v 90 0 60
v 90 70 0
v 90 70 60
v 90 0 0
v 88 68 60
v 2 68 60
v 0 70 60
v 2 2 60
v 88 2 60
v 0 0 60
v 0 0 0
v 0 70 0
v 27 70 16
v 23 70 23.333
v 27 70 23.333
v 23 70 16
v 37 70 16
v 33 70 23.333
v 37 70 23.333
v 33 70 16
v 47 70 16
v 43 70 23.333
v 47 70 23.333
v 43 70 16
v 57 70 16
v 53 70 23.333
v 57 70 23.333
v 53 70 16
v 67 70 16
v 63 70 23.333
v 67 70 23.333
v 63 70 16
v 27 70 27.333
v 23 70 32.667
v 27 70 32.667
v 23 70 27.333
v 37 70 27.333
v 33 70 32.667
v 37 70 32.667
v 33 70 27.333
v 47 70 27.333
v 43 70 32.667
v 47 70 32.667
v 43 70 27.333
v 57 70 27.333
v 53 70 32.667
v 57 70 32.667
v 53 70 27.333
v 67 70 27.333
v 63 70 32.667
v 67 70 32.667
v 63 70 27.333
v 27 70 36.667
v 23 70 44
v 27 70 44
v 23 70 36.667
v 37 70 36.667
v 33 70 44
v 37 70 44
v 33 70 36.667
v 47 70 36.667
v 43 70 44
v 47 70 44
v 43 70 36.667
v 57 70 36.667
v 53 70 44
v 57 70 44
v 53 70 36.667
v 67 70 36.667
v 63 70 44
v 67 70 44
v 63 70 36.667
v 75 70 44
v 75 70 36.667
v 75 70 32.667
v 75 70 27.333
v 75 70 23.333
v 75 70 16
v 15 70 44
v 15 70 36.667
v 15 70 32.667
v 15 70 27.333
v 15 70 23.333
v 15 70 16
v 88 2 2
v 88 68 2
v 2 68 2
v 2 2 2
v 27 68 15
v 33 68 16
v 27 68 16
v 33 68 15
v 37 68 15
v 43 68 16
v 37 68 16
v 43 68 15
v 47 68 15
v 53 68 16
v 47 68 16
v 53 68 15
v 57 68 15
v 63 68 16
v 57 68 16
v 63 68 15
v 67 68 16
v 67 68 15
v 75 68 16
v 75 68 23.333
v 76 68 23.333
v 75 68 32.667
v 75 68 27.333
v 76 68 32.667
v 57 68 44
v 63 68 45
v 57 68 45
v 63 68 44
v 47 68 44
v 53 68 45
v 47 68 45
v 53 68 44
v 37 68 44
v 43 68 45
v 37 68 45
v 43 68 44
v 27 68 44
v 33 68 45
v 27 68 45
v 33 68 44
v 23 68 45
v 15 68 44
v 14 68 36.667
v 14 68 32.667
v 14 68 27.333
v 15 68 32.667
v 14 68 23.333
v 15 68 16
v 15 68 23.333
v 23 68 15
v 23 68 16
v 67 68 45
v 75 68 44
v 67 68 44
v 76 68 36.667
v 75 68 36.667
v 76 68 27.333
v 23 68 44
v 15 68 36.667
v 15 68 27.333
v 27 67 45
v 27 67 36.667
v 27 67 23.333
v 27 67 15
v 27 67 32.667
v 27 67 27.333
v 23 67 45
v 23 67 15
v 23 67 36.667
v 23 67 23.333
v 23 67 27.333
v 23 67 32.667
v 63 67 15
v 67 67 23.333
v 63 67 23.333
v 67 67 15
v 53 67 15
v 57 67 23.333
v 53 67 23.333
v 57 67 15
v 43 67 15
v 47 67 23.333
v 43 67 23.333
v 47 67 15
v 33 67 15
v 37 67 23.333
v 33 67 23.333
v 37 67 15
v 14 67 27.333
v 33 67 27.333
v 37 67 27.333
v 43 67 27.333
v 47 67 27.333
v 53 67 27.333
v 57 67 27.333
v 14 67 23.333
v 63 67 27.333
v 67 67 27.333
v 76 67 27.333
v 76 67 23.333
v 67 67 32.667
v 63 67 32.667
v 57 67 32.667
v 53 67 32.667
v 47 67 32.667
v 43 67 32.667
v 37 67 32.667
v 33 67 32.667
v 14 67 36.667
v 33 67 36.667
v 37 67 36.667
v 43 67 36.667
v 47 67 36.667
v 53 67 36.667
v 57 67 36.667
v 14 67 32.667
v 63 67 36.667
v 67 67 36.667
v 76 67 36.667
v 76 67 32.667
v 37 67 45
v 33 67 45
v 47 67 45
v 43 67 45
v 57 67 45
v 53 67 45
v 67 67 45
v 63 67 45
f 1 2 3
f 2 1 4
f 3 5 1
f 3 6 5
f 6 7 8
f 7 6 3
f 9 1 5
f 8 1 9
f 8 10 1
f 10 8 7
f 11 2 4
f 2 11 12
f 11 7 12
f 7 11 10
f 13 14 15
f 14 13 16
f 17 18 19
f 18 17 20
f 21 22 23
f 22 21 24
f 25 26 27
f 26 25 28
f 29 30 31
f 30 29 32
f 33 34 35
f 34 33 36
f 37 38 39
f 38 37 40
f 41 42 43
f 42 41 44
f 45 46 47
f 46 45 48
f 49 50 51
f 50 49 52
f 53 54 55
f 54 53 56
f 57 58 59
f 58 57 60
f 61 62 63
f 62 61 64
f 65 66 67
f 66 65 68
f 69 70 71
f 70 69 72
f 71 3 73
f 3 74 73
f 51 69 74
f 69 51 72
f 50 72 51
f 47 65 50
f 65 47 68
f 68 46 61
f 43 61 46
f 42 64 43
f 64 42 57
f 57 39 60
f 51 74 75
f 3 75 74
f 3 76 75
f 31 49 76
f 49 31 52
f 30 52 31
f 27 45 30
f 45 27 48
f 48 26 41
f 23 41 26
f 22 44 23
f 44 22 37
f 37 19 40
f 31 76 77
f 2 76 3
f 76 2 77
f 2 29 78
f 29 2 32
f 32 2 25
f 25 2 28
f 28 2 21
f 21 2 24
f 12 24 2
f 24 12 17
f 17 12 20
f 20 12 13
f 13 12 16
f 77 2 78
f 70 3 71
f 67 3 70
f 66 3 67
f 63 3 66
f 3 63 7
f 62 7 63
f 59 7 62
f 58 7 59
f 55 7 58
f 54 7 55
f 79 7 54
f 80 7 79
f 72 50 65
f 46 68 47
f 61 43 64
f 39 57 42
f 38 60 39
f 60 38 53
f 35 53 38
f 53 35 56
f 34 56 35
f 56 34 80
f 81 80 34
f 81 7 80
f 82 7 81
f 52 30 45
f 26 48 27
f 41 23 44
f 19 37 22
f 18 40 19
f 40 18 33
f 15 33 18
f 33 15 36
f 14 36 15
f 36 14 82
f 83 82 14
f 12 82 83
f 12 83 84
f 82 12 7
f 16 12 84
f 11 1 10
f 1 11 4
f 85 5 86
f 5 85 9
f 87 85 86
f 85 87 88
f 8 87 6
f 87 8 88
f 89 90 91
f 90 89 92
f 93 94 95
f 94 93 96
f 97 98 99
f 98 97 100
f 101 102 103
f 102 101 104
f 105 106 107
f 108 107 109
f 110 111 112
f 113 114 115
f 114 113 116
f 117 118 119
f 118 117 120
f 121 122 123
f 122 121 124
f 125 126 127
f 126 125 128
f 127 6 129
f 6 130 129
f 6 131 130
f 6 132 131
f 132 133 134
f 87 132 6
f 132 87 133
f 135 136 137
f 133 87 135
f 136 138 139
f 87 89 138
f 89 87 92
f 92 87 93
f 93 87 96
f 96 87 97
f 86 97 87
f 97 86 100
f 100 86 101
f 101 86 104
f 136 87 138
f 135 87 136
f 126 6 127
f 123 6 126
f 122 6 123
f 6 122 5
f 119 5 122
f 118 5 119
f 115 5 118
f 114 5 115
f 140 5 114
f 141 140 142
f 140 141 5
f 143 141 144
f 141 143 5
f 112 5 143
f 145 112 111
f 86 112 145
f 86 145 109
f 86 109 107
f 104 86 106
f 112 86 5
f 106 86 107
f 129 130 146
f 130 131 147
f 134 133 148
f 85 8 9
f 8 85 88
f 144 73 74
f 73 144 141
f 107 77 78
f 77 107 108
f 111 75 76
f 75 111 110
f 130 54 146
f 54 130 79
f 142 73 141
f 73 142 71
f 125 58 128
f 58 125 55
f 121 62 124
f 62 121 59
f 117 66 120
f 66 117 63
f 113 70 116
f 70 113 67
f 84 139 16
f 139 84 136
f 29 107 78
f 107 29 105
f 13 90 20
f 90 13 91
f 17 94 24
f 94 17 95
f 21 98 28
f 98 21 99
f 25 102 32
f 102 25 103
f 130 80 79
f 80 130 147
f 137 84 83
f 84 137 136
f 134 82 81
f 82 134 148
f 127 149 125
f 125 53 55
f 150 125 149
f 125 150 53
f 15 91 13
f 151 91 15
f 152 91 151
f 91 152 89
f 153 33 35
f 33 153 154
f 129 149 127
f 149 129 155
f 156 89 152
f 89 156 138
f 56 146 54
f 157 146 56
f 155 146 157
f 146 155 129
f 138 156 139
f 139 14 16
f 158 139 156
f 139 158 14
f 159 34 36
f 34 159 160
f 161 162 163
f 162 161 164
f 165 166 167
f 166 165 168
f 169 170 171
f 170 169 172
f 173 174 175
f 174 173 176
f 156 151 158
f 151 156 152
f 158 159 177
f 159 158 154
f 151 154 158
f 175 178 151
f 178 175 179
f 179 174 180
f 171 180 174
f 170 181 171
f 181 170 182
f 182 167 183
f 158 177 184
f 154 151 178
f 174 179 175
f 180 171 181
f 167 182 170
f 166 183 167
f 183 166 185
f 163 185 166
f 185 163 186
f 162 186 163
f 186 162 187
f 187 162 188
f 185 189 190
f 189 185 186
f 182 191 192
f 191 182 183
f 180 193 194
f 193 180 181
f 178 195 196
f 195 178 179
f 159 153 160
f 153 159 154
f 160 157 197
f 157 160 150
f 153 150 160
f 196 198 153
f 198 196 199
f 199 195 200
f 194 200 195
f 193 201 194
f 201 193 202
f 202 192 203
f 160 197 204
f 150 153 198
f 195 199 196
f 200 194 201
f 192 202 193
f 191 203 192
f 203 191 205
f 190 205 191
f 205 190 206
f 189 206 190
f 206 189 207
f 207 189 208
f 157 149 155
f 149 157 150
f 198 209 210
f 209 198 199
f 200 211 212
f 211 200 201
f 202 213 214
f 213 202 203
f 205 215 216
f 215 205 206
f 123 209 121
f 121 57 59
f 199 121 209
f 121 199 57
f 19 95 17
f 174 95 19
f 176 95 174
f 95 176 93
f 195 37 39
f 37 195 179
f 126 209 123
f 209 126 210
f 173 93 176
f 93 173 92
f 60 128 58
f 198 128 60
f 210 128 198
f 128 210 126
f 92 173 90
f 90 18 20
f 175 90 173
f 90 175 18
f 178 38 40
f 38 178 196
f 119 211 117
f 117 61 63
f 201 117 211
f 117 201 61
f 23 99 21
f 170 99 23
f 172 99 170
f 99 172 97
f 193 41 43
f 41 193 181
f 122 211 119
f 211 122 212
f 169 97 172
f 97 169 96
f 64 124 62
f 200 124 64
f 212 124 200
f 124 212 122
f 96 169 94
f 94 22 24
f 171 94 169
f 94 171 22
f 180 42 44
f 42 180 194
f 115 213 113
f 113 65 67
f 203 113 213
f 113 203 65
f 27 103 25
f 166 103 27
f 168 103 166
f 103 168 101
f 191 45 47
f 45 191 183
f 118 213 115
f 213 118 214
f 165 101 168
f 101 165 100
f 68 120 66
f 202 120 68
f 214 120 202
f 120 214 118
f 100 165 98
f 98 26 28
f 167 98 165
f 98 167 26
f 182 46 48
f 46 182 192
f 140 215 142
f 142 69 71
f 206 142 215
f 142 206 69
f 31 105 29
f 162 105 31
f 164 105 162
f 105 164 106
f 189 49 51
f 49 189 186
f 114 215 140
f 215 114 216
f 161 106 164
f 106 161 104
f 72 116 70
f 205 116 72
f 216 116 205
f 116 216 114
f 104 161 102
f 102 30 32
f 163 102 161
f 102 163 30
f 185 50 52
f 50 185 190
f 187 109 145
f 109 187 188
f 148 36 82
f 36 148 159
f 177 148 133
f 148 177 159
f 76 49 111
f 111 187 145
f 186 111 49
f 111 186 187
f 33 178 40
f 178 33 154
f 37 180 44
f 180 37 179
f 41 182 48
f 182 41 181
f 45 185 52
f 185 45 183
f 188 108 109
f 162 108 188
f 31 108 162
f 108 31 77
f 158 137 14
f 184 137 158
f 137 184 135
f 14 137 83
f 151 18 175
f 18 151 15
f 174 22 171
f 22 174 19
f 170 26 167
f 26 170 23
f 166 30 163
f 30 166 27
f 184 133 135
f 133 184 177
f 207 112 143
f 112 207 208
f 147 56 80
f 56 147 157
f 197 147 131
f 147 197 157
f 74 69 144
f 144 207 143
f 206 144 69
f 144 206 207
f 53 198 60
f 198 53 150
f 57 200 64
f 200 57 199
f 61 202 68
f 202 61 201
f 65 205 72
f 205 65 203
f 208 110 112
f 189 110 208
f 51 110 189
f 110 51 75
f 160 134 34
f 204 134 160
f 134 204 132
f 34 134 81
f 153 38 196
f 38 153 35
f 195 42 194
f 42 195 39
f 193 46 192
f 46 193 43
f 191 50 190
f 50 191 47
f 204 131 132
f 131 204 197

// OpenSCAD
$fn = 32;

// ----------------------------------------------------------------------
// Vent box: crossgrid enclosure
// ----------------------------------------------------------------------

// --- parameters (mm) ---
box_l = 90;               // box length, X
box_w = 70;               // box width, Y
box_h = 60;               // box height, Z
wall_t = 2;               // shell wall thickness
win_l = 60;               // vent window width, X
win_h = 28;               // vent window height, Z
bar_w = 4;                // grid bar width
n_v = 5;                  // vertical bar count
n_h = 2;                  // horizontal bar count

win_z0 = (box_h - win_h) / 2;  // window lower edge Z
v_step = win_l / (n_v + 1);  // vertical bar step
h_step = win_h / (n_h + 1);  // horizontal bar step

difference() {
  union() {
    difference() {
      cube([box_l, box_w, box_h]);
  translate([wall_t, wall_t, wall_t])
    cube([box_l - 2 * wall_t, box_w - 2 * wall_t, box_h]);
  translate([(box_l - win_l) / 2, box_w - wall_t - 1, win_z0])
    cube([win_l, wall_t + 2, win_h]);
    }
    for (i = [1 : n_v])
      translate([(box_l - win_l) / 2 + i * v_step - bar_w / 2,
                 box_w - wall_t - 1, win_z0 - 1])
        cube([bar_w, wall_t + 1, win_h + 2]);
    for (i = [1 : n_h])
      translate([(box_l - win_l) / 2 - 1, box_w - wall_t - 1,
                 win_z0 + i * h_step - bar_w / 2])
        cube([win_l + 2, wall_t + 1, bar_w]);
  }
}
